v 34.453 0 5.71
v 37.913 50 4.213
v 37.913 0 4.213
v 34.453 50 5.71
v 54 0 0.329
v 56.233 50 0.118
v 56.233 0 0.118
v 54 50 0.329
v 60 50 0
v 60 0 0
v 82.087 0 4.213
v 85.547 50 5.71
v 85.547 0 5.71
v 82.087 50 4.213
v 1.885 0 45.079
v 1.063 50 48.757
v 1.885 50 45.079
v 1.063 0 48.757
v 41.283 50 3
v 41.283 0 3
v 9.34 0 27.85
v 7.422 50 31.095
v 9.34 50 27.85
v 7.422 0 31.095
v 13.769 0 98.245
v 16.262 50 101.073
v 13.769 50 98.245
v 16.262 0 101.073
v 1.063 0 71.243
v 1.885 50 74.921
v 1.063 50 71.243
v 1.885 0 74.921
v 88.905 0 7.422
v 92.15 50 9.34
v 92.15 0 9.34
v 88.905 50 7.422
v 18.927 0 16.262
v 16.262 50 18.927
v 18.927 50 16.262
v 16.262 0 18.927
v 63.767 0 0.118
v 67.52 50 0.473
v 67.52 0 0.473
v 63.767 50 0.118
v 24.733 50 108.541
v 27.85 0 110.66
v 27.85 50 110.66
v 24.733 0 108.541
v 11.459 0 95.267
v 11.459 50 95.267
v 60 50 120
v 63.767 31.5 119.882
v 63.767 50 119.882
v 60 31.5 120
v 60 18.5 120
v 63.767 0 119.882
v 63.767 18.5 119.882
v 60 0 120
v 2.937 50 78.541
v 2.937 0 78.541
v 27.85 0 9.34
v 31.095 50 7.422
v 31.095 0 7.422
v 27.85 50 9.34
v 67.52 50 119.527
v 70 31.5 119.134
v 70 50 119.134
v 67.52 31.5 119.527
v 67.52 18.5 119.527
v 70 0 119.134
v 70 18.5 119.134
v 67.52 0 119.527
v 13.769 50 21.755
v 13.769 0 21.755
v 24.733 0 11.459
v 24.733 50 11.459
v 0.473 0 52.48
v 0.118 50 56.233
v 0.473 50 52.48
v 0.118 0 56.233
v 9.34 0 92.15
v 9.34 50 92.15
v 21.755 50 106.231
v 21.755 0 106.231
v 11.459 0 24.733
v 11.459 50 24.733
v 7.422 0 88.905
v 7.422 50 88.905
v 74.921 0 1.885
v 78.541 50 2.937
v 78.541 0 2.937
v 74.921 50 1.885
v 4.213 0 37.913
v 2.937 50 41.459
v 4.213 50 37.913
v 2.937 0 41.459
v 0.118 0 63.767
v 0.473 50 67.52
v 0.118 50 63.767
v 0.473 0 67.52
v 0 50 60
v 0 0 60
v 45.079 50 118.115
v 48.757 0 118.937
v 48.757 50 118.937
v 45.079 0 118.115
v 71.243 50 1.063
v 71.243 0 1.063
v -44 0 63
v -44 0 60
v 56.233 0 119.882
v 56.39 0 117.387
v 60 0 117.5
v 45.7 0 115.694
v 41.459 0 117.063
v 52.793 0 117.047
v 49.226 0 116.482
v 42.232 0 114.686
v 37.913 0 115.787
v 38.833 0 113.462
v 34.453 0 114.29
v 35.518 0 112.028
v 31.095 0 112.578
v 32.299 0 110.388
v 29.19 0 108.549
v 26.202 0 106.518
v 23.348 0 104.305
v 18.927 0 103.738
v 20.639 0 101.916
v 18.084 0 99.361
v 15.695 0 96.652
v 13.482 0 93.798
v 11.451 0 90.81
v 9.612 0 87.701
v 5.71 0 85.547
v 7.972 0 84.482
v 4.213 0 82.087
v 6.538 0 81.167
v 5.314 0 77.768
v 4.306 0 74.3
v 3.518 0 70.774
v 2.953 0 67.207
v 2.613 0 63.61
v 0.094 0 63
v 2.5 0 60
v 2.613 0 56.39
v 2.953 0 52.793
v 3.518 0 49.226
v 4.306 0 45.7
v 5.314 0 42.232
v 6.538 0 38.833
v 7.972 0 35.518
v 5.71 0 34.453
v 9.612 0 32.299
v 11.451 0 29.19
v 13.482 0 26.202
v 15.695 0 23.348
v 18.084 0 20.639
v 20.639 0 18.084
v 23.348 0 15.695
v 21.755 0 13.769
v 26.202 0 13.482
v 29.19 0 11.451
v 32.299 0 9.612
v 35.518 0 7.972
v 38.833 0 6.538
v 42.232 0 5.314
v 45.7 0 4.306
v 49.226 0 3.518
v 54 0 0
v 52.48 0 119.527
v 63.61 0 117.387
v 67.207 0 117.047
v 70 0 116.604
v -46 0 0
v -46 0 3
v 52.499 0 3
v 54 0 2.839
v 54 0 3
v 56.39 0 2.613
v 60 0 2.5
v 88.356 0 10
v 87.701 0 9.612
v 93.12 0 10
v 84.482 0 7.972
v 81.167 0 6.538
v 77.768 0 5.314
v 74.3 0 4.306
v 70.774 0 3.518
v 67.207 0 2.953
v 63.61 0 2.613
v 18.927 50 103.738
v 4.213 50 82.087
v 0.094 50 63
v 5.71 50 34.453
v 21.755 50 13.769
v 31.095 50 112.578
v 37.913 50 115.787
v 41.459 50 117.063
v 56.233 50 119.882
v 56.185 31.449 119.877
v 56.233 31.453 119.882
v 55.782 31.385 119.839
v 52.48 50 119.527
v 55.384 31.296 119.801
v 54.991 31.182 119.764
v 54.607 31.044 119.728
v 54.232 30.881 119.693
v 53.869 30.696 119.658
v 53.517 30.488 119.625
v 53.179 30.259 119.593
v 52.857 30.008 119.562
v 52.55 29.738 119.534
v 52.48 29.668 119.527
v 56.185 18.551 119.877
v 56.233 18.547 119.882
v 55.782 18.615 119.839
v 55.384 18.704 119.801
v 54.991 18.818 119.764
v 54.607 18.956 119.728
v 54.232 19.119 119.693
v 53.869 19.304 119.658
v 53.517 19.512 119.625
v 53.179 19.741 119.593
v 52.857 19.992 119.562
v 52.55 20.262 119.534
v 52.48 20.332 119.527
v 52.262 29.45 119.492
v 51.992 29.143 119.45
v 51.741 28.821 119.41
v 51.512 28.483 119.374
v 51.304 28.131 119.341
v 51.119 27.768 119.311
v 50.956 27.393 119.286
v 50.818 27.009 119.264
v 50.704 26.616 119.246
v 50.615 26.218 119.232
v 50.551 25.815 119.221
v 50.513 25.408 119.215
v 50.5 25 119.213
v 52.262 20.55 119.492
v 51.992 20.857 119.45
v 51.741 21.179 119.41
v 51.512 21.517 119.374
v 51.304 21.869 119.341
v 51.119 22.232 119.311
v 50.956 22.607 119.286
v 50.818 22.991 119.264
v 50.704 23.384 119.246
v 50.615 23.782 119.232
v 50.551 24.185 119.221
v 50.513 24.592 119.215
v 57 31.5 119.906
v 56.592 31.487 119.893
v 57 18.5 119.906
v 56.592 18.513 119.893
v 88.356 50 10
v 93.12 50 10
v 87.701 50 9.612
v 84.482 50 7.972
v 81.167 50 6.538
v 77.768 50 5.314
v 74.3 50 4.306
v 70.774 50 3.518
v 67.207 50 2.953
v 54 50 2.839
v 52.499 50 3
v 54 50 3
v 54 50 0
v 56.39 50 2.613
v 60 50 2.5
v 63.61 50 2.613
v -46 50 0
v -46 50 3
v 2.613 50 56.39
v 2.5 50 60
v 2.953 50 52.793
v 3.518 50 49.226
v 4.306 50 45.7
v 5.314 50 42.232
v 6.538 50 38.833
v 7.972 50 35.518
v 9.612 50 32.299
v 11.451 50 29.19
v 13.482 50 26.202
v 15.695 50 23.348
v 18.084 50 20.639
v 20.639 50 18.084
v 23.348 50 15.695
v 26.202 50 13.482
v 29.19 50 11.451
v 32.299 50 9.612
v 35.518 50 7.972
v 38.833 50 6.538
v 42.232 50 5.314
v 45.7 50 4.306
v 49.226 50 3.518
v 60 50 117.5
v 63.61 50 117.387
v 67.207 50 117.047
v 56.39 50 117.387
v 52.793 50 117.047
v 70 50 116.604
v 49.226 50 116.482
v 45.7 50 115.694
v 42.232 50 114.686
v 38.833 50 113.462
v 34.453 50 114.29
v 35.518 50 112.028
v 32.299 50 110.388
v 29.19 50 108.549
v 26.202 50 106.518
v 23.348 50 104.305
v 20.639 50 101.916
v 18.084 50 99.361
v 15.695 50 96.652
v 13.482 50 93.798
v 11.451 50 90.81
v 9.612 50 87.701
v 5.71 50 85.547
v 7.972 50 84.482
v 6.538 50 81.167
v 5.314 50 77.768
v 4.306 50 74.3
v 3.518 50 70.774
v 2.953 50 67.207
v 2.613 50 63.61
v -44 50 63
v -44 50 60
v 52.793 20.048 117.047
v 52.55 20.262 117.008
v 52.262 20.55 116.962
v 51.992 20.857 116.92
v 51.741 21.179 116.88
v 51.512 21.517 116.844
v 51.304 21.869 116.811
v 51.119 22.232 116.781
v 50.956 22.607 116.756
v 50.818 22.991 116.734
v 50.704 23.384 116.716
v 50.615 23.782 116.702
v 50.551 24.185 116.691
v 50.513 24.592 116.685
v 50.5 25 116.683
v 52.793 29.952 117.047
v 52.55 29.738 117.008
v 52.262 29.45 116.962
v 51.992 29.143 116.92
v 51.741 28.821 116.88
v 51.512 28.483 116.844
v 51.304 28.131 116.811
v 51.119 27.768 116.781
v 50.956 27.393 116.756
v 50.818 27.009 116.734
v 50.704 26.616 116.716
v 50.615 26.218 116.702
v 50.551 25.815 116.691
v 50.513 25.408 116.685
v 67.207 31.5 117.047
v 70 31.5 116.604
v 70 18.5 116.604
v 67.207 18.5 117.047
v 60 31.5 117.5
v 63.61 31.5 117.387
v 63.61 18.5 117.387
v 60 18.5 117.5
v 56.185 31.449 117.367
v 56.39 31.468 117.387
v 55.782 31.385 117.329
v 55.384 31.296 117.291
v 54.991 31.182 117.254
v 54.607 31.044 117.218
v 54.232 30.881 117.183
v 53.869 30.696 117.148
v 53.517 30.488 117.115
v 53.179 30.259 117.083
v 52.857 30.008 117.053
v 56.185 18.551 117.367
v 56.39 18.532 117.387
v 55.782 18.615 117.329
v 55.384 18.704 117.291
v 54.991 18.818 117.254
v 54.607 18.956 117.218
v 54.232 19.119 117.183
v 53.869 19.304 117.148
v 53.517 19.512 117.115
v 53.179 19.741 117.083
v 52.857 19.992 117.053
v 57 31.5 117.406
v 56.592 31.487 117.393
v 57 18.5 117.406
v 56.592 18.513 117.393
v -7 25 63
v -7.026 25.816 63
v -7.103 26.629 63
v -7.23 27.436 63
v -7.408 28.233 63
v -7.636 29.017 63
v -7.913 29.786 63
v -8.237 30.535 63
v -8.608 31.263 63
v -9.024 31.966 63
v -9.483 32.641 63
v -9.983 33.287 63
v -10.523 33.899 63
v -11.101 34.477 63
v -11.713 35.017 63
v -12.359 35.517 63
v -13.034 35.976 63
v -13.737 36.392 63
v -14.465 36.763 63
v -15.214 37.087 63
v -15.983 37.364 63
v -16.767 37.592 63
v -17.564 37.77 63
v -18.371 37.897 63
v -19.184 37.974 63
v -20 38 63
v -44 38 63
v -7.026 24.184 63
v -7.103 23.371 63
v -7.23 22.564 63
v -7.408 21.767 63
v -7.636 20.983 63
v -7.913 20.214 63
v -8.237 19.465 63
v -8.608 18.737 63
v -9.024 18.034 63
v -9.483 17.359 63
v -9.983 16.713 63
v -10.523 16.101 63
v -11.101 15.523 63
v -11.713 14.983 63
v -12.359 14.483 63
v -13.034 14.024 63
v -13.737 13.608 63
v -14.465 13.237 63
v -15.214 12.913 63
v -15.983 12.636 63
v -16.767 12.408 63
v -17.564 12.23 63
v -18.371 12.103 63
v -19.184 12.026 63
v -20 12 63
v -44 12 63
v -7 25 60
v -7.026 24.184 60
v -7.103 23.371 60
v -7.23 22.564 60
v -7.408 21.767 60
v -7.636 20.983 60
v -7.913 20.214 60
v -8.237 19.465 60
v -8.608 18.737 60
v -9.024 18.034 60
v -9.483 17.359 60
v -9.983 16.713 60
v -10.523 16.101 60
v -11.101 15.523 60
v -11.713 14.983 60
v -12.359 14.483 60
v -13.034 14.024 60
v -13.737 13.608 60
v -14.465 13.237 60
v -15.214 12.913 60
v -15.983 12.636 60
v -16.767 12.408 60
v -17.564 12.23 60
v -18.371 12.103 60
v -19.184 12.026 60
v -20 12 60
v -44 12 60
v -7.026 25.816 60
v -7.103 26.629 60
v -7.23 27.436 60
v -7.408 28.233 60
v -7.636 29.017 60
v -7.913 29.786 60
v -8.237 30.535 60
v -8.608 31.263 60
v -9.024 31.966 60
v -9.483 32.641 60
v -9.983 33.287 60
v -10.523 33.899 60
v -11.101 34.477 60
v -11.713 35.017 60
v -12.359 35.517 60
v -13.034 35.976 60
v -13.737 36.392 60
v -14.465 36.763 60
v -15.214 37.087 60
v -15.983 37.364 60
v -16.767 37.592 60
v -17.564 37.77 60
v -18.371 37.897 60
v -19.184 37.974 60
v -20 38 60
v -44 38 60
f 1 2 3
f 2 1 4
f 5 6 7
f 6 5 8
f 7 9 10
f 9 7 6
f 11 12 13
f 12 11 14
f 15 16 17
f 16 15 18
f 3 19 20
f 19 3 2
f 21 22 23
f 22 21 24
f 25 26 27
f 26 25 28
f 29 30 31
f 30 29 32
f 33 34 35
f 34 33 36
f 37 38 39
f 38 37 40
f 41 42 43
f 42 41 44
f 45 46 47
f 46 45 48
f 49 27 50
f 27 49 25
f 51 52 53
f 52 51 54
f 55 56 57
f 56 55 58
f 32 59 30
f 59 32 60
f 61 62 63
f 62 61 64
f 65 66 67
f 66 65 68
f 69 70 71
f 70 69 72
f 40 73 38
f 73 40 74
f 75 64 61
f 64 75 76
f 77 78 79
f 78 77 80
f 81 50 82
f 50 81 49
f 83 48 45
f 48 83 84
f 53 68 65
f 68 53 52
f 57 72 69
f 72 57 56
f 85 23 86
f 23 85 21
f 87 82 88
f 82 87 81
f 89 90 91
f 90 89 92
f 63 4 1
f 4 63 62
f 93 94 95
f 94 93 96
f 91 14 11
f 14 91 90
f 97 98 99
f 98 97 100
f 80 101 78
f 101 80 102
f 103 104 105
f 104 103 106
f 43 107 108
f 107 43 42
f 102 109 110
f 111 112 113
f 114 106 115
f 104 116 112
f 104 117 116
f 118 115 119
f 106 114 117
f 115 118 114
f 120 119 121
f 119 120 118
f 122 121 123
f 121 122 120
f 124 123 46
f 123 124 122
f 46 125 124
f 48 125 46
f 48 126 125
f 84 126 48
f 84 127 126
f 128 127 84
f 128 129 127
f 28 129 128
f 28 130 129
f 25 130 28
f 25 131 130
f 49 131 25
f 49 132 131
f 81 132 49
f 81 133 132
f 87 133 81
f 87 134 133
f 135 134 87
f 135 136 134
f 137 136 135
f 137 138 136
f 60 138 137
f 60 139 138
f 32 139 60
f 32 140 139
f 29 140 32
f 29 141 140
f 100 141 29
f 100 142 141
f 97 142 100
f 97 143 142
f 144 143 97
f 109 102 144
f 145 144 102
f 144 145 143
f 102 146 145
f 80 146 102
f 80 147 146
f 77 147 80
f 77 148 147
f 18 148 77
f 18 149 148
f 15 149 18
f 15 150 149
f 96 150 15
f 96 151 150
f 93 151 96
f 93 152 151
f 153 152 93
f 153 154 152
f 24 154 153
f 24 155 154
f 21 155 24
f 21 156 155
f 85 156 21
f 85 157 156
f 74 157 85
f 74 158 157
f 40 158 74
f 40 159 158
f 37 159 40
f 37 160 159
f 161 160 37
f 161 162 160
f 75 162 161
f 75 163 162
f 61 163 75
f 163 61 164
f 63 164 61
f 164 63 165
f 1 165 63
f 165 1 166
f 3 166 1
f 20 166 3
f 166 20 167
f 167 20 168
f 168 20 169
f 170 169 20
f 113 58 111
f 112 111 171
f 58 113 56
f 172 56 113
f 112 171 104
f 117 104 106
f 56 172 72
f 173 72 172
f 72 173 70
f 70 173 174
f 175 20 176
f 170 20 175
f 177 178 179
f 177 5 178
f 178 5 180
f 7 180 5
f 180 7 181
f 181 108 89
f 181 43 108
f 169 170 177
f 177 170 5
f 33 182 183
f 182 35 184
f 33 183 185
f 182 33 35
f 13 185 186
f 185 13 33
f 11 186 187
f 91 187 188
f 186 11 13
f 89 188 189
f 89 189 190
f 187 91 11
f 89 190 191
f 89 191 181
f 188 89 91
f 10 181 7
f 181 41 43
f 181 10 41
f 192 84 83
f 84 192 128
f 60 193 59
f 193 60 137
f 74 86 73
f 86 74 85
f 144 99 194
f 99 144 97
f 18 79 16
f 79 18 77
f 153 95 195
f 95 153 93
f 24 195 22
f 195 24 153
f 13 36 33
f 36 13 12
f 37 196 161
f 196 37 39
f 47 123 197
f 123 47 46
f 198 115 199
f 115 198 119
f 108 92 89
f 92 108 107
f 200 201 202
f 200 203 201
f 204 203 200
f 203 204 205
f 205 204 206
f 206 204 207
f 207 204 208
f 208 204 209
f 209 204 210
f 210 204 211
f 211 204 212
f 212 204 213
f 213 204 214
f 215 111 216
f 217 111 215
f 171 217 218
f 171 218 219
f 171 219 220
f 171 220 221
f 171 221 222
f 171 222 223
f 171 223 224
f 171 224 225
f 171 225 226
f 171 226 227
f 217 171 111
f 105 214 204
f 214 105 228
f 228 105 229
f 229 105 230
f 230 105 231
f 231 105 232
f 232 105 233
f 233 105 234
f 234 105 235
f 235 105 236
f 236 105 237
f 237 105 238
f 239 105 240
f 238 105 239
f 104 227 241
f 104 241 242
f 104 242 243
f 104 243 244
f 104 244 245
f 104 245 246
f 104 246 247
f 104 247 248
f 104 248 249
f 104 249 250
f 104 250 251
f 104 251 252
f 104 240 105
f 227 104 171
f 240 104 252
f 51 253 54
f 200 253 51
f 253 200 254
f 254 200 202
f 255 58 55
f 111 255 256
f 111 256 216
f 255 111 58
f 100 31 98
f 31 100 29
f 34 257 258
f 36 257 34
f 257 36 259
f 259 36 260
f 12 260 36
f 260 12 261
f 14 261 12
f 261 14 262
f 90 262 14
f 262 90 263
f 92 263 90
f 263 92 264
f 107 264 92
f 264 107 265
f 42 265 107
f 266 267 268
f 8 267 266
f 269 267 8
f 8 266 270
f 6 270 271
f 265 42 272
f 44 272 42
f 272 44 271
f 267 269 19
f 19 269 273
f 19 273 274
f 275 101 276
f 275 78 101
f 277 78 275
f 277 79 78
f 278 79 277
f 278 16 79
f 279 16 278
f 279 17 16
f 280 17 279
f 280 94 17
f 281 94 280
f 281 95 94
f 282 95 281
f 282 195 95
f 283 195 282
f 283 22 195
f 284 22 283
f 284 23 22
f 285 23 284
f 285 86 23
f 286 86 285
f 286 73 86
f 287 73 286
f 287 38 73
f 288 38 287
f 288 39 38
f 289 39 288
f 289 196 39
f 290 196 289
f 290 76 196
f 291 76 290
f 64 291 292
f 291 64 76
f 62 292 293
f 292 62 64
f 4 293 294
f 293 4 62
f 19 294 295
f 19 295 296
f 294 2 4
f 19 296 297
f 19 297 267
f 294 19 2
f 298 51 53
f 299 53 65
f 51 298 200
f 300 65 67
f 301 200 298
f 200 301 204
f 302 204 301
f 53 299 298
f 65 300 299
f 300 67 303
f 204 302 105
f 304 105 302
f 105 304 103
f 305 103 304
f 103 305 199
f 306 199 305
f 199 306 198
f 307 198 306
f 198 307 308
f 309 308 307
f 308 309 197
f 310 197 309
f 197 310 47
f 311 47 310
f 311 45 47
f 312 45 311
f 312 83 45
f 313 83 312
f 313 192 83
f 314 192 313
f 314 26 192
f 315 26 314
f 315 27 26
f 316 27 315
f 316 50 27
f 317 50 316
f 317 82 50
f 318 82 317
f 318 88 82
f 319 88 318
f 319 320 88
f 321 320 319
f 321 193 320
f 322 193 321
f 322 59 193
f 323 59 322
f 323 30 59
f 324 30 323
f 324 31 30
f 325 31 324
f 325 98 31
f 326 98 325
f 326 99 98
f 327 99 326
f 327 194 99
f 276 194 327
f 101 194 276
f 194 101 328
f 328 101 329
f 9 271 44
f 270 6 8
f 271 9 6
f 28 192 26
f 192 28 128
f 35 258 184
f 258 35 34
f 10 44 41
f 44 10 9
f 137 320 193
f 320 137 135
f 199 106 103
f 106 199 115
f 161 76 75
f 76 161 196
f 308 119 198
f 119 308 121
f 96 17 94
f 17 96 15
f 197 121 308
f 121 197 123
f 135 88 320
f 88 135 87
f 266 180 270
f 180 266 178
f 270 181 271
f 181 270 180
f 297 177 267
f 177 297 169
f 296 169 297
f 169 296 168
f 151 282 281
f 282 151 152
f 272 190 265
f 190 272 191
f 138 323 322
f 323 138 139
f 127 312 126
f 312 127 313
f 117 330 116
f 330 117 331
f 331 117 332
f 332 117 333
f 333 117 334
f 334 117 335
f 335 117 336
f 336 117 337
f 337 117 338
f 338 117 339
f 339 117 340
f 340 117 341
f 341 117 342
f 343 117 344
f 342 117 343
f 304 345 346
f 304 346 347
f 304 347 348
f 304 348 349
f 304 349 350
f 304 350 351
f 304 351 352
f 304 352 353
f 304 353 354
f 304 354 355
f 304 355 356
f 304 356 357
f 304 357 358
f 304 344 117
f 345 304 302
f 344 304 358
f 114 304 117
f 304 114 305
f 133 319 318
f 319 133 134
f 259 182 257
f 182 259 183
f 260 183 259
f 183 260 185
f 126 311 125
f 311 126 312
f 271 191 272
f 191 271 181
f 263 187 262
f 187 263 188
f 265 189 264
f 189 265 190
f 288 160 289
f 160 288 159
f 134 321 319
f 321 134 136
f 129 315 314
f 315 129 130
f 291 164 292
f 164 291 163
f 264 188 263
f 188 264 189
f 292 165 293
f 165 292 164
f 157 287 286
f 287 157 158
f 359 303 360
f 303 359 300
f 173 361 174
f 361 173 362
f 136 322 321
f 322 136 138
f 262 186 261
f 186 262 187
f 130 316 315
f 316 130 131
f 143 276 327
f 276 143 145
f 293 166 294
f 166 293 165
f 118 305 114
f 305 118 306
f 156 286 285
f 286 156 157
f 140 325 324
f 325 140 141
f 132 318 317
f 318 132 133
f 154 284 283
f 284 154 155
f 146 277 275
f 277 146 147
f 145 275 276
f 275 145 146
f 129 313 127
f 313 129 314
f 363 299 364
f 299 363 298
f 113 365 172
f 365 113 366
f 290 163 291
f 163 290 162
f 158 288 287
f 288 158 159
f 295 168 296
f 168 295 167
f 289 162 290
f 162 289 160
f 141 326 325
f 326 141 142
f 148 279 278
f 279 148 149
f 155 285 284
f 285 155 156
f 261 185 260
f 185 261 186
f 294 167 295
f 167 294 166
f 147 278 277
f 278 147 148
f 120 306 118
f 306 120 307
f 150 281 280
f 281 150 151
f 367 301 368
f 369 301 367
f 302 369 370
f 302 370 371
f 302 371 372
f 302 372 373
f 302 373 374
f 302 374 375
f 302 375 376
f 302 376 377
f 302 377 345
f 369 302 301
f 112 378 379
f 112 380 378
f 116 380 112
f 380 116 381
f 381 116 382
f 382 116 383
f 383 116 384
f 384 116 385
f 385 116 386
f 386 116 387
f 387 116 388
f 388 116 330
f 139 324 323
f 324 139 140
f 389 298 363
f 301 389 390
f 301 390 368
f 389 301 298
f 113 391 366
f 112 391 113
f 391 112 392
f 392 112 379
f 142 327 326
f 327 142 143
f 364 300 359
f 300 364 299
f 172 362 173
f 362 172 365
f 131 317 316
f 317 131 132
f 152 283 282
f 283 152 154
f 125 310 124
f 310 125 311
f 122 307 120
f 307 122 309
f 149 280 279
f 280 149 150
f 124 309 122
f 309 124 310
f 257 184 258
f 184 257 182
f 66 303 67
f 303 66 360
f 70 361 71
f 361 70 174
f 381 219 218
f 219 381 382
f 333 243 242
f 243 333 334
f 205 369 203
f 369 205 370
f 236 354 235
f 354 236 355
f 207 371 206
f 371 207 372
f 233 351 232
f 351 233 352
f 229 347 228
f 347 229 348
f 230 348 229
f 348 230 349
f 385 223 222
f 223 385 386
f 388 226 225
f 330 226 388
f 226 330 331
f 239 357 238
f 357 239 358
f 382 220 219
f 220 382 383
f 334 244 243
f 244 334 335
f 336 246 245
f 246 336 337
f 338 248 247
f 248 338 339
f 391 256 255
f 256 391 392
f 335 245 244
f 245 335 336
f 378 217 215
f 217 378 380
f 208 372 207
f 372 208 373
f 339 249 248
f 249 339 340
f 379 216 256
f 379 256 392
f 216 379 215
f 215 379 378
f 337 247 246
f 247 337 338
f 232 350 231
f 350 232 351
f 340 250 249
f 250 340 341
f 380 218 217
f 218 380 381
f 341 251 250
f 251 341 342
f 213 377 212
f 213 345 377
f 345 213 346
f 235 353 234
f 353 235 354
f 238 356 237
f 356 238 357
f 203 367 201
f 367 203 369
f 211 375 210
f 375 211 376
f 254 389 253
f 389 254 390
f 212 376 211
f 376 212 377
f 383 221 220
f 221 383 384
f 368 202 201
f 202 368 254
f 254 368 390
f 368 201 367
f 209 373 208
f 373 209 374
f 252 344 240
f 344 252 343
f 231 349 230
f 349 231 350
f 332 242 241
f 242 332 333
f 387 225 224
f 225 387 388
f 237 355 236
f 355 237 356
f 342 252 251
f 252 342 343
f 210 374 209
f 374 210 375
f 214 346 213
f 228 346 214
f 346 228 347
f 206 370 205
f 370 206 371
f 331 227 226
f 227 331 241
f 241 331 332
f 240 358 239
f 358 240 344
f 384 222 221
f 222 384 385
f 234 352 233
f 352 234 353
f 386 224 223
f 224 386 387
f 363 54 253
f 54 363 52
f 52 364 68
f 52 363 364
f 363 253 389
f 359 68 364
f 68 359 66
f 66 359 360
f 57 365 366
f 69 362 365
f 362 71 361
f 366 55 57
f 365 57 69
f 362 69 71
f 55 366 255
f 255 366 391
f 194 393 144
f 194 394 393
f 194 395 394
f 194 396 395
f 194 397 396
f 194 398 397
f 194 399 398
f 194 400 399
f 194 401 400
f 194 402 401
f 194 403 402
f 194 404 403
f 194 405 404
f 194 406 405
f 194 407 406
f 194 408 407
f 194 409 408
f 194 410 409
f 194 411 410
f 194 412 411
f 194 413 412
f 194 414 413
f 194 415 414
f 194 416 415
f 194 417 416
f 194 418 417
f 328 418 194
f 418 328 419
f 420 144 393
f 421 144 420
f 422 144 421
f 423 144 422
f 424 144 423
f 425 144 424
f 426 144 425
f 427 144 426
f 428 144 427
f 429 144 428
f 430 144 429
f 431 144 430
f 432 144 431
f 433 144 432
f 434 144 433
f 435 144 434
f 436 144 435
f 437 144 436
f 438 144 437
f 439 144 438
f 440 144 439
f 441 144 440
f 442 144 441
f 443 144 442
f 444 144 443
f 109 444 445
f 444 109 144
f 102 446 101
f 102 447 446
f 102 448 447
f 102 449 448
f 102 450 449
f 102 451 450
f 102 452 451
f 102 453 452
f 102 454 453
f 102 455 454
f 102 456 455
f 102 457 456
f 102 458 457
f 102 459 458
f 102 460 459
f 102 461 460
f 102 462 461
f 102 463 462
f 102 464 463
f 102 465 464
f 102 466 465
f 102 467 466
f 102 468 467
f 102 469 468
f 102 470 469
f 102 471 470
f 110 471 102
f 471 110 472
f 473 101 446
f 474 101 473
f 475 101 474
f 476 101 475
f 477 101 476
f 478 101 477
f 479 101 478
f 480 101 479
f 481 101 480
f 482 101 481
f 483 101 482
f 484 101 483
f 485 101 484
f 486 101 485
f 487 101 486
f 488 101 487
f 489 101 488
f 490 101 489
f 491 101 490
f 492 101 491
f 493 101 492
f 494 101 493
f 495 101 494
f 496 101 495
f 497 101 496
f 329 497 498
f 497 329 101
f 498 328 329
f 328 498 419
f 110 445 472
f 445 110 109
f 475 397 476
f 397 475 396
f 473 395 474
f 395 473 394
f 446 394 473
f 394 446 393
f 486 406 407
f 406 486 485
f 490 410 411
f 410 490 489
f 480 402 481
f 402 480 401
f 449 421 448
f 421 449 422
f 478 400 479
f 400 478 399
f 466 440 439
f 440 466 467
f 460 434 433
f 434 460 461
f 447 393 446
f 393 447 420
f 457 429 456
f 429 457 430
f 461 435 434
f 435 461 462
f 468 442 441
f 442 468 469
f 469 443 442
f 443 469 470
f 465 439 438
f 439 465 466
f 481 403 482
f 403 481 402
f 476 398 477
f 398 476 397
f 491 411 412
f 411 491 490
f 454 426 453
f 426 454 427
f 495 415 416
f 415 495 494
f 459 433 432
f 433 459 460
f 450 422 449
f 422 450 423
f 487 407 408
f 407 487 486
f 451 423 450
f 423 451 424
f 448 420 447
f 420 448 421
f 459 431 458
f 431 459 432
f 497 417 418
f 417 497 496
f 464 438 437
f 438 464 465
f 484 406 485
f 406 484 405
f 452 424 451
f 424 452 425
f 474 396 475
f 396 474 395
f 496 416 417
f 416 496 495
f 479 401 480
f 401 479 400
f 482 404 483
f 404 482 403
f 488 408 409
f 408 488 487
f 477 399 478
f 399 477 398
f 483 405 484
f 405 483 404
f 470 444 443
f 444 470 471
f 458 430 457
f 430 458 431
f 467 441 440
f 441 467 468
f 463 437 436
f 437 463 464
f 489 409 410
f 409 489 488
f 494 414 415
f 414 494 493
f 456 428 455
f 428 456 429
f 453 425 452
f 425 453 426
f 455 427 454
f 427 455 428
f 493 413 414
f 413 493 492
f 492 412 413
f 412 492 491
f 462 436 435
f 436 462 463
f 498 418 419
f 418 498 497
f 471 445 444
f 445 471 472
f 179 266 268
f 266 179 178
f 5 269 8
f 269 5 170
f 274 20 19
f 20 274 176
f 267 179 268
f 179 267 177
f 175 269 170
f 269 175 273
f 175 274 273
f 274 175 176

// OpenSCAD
razordiameter=13;
brushdiameter=26;

 $fn=100;
 translate([60,0,60]) difference(){
   rotate([0,90,90])difference(){
        cylinder(h=50, d=120);
        translate([0,0,-3]) cylinder(h=55, d=115);
    }
    translate([10,-1,-50])cube([120,52,120]);
    translate([-3,25,52])cylinder(h=10, d=razordiameter);
    translate([-3,(50/2)-(razordiameter/2),52])rotate([0,0,0])cube([24,razordiameter,15]);
}
translate([-46,0,0])cube([100,50,3]);
difference(){
    translate([-44,0,60])cube([45,50,3]);
    translate([-20,25,59])cylinder(h=10, d=brushdiameter);
    translate([-50,(50/2)-(brushdiameter/2),59])cube([30,brushdiameter,10]);
}
